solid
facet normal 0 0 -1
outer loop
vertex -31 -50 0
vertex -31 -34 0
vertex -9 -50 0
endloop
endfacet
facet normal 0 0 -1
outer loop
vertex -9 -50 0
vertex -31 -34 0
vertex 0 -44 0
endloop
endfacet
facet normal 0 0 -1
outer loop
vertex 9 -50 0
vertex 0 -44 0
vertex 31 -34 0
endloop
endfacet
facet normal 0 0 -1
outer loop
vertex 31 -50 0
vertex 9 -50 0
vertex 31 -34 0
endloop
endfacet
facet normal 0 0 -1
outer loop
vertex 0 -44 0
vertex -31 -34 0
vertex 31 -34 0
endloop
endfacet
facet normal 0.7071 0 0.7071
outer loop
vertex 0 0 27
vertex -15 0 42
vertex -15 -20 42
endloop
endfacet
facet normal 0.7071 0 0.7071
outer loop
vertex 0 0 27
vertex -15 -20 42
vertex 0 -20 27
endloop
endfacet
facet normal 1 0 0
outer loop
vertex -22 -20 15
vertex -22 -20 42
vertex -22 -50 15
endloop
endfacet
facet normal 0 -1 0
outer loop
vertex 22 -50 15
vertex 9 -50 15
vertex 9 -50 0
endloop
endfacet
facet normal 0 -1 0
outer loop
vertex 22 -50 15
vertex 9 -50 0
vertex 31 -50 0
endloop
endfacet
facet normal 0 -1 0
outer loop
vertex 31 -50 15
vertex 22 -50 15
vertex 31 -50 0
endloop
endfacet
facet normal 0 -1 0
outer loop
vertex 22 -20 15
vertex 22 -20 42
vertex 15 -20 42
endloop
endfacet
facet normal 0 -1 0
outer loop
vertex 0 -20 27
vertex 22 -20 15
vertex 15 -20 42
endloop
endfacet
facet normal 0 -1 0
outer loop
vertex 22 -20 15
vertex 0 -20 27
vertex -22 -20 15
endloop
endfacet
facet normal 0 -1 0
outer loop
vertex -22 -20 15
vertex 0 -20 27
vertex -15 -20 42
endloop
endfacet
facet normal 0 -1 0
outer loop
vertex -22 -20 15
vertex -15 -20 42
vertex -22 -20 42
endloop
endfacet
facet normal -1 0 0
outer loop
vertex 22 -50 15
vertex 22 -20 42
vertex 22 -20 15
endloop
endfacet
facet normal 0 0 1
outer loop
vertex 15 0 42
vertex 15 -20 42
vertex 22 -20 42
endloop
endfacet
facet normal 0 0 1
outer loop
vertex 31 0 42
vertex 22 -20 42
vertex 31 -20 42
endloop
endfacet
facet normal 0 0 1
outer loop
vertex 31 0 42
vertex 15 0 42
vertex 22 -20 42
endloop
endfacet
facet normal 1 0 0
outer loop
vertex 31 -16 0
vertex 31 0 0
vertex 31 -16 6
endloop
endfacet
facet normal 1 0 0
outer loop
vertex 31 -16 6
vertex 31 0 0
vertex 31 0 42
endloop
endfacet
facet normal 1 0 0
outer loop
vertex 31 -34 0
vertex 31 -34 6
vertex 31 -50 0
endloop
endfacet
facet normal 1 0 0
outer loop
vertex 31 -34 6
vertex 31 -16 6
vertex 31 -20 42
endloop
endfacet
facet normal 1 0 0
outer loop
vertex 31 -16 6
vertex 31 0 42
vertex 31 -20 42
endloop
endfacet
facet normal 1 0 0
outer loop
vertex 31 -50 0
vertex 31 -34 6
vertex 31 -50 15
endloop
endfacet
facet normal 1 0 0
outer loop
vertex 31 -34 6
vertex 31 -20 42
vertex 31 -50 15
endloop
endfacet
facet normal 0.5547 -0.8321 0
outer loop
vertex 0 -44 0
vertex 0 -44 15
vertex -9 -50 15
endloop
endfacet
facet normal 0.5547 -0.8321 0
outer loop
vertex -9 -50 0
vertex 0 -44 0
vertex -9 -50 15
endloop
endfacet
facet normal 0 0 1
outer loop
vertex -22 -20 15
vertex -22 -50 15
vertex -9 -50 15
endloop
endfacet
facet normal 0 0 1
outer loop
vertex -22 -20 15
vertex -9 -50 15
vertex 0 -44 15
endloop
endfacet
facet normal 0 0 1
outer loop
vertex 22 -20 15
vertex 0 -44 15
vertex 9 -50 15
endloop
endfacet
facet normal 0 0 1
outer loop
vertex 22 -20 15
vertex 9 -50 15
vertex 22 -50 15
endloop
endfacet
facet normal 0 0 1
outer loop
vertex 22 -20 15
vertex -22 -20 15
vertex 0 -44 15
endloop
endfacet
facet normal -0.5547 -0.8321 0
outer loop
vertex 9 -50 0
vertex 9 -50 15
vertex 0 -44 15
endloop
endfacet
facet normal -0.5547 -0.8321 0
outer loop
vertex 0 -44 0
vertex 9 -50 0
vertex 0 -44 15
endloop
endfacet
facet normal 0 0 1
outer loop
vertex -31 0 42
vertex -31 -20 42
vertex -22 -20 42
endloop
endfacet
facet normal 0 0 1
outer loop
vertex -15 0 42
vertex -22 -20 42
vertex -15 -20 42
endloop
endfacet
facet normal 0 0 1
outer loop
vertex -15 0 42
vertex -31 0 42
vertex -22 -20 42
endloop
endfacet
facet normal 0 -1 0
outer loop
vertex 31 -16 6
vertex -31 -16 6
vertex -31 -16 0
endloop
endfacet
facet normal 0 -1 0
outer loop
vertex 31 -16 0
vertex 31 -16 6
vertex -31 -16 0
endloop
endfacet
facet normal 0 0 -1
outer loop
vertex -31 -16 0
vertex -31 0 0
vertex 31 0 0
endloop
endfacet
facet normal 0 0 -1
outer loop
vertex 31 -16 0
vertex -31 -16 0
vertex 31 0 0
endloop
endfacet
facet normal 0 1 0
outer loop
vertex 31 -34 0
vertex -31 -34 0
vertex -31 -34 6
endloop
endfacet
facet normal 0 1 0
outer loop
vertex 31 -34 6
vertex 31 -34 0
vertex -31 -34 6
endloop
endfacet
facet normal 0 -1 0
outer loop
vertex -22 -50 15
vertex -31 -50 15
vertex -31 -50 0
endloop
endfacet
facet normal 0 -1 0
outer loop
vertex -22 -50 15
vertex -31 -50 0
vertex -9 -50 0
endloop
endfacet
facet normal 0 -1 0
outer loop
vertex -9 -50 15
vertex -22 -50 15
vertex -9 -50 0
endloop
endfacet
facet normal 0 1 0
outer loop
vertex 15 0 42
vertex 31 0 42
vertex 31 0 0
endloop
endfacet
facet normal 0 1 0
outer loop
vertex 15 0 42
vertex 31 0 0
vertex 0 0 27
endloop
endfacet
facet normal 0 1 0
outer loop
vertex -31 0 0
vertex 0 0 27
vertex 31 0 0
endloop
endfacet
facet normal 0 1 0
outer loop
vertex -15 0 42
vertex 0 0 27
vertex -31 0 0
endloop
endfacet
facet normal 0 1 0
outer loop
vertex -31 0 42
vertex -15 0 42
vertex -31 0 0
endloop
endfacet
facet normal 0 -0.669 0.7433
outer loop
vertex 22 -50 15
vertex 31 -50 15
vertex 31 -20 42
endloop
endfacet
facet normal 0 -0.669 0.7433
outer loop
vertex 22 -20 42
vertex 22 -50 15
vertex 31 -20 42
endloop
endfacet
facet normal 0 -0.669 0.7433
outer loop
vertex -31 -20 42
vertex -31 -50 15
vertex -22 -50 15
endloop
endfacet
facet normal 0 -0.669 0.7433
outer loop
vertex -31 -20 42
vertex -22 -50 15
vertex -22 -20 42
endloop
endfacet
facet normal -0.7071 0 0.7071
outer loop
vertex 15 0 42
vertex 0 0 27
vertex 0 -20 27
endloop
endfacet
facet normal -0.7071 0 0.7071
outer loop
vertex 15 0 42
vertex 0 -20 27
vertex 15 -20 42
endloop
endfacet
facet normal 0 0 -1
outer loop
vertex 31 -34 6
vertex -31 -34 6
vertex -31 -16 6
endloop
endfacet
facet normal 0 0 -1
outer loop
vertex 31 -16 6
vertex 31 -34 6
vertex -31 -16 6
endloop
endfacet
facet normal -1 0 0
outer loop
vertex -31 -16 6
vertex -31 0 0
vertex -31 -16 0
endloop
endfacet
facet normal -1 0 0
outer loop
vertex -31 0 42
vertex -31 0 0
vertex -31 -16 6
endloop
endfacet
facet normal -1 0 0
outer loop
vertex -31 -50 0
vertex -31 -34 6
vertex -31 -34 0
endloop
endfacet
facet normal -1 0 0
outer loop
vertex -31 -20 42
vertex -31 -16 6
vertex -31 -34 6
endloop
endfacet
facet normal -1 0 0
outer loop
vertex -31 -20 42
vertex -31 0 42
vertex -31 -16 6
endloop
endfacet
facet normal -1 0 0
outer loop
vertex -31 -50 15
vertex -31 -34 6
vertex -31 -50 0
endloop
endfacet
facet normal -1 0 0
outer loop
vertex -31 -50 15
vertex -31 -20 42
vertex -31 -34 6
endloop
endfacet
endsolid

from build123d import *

# Parameters (mm, degrees)
F0_W      = 62
F0_H      = 15
F1_DEPTH  = 50
F3_DEPTH  = 20
F7_DEPTH  = 62
F8_DEPTH  = 9
F10_DEPTH = 25


# Not quite as in the source:
# - a pattern or mirror of a feature is missing from the dataset's text; its kind, count and spacing are read off the source's solid


with BuildPart() as f1:
    # F0 (on Front) → F1 (new body)
    with BuildSketch(Plane.XZ):
        with Locations((0, 7.5)):
            Rectangle(F0_W, F0_H)
    extrude(amount=F1_DEPTH)

    # F2 (on face) → F3 (join)
    with BuildSketch(Plane(origin=(0, 0, 0), x_dir=(-1, 0, 0), z_dir=(0, 1, 0))):
        Polygon((-31, 15), (31, 15), (31, 42), (15, 42), (0, 27), (-15, 42), (-31, 42), align=None)
    extrude(amount=-F3_DEPTH)

    # F5 (on face) → F7 (cut)
    with BuildSketch(Plane(origin=(-31, 0, 0), x_dir=(0, -1, 0), z_dir=(-1, 0, 0))):
        Polygon((16, 6), (16, 0), (25, 0), (34, 0), (34, 6), align=None)
    extrude(amount=-F7_DEPTH, mode=Mode.SUBTRACT)

    # F6 (on face) → F8 (join)
    with BuildSketch(Plane(origin=(-31, 0, 0), x_dir=(0, -1, 0), z_dir=(-1, 0, 0))):
        Polygon((50, 15), (20, 42), (20, 15), align=None)
    f8 = extrude(amount=-F8_DEPTH)

    # F8_copies: F8 across plane
    add(f8.mirror(Plane(origin=(0, 0, 0), x_dir=(0, 0, 1), z_dir=(1, 0, 0))))

    # F9 (on face) → F10 (cut)
    with BuildSketch(Plane.XY.offset(15)):
        Polygon((0, -44), (-9, -50), (9, -50), align=None)
    extrude(amount=-F10_DEPTH, mode=Mode.SUBTRACT)


solid = f1.part
